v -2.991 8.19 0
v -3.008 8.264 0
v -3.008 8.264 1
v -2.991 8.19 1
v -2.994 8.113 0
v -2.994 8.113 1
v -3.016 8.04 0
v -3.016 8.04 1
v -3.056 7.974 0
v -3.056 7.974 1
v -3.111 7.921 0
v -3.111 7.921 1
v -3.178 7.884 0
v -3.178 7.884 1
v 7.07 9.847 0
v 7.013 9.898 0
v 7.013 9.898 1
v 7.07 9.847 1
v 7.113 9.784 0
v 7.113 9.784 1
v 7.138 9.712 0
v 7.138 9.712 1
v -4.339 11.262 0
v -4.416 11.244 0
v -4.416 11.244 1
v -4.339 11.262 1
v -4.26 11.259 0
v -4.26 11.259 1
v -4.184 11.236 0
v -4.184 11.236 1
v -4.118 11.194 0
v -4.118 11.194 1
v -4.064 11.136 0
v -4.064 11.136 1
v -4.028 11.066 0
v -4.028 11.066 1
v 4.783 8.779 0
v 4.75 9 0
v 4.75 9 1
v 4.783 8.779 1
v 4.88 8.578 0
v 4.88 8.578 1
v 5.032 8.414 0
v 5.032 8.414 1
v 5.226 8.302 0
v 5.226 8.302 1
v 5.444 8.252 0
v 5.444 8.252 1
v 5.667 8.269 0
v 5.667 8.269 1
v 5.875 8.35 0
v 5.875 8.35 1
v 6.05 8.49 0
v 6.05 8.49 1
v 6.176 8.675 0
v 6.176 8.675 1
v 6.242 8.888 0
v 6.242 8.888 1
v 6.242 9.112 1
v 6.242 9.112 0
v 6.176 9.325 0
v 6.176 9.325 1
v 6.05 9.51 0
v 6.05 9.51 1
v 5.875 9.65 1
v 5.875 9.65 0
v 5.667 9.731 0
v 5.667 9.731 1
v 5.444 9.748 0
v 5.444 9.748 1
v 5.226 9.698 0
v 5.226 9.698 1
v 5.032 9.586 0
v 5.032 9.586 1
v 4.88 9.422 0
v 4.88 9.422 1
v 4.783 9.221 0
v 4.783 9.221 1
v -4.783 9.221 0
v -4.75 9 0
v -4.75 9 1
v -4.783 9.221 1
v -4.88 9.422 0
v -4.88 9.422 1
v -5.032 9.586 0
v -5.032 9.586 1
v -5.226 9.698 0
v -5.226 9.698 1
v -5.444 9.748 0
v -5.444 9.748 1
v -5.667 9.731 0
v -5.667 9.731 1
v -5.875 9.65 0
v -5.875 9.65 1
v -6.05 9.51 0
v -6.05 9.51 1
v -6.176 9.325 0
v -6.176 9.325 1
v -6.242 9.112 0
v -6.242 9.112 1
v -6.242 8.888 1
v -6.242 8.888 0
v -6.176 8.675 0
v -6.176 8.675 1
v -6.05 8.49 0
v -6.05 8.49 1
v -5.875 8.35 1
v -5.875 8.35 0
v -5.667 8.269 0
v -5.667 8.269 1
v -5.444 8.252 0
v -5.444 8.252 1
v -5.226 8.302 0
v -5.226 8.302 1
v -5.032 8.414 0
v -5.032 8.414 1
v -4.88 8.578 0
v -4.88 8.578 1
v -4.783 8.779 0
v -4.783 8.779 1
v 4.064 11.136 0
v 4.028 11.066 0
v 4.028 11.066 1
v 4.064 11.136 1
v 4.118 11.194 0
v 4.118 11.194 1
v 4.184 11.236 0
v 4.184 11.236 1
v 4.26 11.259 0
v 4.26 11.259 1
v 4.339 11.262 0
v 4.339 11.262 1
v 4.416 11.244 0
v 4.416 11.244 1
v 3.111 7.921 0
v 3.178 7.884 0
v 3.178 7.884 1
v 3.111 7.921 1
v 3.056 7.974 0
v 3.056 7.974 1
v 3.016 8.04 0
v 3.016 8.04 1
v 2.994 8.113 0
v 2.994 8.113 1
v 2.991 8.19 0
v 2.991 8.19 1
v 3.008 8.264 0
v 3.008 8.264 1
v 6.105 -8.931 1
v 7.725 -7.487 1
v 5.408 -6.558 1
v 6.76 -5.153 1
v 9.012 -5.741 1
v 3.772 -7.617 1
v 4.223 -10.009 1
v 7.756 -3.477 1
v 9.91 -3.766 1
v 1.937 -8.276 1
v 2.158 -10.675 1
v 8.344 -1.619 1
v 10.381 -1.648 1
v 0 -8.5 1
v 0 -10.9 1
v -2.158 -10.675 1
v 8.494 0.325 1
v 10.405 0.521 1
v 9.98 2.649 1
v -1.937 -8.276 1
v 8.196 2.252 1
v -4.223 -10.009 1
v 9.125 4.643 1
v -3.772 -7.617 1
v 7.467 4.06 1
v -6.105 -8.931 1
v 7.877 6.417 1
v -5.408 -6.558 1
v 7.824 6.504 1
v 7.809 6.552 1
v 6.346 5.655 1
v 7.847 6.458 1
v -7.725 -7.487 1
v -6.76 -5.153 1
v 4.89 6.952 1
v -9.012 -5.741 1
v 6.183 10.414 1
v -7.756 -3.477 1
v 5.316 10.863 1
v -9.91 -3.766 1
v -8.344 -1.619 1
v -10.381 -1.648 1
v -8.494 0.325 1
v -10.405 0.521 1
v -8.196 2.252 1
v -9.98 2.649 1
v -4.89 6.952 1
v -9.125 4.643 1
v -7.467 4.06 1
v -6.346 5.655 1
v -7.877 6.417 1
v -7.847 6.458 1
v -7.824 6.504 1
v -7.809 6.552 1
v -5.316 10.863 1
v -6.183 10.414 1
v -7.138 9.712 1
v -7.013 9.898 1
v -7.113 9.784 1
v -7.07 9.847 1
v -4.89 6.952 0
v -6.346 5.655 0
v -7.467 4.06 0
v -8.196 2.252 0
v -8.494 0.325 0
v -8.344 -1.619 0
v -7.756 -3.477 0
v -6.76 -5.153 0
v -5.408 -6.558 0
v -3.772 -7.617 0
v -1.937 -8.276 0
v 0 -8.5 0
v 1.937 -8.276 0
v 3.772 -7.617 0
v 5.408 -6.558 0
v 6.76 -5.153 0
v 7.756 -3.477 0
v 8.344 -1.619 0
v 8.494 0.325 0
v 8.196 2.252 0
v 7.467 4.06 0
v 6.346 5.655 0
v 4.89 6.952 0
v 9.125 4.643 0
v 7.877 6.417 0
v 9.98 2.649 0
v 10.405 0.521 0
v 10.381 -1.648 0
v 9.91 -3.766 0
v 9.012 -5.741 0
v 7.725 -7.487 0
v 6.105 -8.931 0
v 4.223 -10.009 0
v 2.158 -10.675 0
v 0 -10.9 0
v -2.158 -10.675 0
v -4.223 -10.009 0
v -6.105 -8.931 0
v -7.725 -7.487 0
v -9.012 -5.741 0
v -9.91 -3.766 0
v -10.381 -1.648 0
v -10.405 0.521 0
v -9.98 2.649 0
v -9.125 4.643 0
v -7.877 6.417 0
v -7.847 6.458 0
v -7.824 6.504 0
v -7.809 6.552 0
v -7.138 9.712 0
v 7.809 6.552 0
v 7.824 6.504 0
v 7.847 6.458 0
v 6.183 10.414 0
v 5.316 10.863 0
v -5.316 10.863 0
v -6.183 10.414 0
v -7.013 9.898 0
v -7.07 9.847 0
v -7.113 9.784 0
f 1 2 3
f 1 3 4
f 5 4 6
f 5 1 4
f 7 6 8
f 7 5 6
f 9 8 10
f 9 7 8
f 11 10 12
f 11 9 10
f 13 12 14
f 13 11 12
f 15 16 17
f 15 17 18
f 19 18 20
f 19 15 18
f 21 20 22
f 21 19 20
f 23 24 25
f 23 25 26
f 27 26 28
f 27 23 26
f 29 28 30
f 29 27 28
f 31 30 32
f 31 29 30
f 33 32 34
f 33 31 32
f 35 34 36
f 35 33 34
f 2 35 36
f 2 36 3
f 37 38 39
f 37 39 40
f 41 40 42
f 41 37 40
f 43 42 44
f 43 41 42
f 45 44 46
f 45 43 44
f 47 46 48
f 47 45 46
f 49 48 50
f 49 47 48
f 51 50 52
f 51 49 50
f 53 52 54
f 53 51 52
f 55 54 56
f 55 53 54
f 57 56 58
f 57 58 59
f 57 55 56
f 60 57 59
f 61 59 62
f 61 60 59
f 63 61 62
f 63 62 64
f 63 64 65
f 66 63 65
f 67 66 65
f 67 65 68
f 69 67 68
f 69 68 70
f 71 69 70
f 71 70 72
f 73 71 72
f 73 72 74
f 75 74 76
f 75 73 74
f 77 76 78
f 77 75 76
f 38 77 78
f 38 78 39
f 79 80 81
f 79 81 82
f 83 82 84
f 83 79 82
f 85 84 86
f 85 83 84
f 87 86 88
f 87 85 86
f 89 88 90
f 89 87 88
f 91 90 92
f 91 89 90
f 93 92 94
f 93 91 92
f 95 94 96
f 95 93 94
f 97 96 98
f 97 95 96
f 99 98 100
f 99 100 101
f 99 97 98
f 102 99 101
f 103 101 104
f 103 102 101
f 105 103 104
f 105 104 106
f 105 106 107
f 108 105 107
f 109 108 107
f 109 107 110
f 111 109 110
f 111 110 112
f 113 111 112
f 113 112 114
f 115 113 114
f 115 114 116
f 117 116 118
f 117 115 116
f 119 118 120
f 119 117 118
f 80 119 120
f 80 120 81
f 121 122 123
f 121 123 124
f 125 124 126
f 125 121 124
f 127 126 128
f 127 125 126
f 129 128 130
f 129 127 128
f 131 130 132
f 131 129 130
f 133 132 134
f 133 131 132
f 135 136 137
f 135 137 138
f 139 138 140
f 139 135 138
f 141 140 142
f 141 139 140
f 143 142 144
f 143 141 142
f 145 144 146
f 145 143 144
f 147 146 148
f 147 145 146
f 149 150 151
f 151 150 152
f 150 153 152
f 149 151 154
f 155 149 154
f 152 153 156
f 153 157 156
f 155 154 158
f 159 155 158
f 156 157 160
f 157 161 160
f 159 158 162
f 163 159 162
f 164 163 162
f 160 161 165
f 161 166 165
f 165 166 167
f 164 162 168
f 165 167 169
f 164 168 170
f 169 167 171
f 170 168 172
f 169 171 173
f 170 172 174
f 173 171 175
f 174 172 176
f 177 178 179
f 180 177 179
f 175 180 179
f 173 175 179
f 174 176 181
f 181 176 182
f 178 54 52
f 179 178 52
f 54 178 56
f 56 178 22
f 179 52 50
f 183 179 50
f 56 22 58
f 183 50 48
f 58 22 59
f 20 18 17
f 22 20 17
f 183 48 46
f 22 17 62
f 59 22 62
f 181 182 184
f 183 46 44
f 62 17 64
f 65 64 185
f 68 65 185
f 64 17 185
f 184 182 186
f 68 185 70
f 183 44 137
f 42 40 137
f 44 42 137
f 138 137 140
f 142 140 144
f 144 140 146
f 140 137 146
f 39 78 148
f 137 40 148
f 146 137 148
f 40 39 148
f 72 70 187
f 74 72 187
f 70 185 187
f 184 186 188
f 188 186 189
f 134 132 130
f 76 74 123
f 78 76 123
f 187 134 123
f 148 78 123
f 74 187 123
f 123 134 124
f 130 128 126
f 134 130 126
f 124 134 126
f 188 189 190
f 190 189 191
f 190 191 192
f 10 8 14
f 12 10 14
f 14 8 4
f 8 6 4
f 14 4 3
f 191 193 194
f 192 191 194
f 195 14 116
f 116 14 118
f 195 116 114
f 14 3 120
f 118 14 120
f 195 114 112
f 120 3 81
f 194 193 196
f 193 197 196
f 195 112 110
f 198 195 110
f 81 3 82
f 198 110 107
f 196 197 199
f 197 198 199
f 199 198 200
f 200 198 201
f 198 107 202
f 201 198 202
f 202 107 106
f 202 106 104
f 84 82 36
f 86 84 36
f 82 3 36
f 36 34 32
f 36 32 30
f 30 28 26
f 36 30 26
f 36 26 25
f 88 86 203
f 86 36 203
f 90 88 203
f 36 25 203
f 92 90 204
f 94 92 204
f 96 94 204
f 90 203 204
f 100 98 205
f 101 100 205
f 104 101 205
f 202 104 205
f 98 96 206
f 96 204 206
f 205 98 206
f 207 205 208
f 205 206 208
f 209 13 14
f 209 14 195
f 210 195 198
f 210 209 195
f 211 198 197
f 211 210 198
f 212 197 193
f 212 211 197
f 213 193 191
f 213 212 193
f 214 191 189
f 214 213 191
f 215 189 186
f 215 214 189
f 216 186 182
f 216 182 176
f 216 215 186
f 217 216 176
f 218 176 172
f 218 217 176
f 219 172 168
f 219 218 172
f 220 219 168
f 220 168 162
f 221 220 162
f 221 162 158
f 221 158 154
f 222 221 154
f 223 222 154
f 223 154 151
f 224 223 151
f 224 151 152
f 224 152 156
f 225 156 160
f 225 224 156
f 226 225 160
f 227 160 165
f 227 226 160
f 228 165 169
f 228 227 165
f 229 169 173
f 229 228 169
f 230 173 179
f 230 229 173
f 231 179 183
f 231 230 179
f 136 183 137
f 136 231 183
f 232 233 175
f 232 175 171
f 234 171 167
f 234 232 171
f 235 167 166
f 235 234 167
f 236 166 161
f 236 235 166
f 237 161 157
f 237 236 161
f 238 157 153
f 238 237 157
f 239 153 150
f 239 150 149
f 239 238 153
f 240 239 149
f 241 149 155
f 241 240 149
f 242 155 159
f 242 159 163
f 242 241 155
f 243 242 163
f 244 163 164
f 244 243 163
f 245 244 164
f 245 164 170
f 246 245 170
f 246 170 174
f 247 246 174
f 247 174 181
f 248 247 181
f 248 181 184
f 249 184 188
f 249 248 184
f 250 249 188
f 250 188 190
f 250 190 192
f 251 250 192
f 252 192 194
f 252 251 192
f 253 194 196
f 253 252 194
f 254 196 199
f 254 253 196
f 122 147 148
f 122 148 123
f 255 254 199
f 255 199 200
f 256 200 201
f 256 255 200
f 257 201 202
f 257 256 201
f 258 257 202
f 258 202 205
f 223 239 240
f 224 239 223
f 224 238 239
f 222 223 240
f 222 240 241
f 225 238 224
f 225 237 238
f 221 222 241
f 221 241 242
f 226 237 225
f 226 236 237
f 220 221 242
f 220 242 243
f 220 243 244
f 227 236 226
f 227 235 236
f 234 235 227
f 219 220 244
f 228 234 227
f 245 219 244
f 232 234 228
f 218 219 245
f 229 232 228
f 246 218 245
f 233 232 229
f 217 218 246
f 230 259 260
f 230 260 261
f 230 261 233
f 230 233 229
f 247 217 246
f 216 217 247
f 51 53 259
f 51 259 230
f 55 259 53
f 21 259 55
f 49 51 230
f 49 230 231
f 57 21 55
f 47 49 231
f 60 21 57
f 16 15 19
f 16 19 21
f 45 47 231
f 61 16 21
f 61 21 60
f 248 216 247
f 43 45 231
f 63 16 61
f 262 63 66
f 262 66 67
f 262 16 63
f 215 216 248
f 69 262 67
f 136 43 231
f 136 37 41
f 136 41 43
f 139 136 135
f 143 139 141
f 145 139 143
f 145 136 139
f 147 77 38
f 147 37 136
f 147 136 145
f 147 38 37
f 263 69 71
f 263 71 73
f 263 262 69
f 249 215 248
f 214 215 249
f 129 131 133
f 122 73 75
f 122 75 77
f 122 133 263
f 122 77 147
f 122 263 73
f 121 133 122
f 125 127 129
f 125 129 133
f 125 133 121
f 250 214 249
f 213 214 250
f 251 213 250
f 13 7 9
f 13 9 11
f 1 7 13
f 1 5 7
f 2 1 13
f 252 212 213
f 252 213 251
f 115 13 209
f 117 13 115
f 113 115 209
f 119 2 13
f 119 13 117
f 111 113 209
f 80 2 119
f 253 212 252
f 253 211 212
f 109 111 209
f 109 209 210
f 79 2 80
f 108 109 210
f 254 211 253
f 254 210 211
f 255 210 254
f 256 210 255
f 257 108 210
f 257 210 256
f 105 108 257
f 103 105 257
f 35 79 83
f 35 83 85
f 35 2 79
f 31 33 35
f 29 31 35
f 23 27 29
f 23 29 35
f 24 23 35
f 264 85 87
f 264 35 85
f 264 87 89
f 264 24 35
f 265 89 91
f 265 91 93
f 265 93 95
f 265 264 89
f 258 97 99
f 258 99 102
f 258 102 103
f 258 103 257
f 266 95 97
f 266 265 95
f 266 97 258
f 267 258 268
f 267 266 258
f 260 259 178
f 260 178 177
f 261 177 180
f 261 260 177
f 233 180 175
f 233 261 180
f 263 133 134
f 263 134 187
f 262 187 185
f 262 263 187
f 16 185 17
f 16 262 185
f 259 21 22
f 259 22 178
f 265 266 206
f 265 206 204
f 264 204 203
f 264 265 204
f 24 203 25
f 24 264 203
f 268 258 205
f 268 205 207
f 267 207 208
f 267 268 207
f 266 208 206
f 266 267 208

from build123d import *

# Parameters (mm, degrees)
ESQUISSE1_R      = 0.75
EXTRUSION1_DEPTH = 1


with BuildPart() as part:
    # Esquisse1 → Extrusion1 (new body)
    with BuildSketch(Plane.XY):
        with BuildLine():
            Line((-7.809424908, 6.552045147), (-7.137842505, 9.711591939))
            ThreePointArc((-7.137842505, 9.711591939), (-7.093293962, 9.816702497), (-7.012703099, 9.897559869))
            ThreePointArc((-7.012703099, 9.897559869), (-5.753680876, 10.647078732), (-4.415601587, 11.244120857))
            ThreePointArc((-4.415601587, 11.244120857), (-4.184471882, 11.23610854), (-4.027719362, 11.066068))
            Line((-4.027719362, 11.066068), (-3.008027786, 8.26448842))
            ThreePointArc((-3.008027786, 8.26448842), (-3.015921319, 8.039750525), (-3.177778678, 7.883636386))
            ThreePointArc((-3.177778678, 7.883636386), (0, -8.5), (3.177778678, 7.883636386))
            ThreePointArc((3.177778678, 7.883636386), (3.015921319, 8.039750525), (3.008027786, 8.26448842))
            Line((3.008027786, 8.26448842), (4.027719362, 11.066068))
            ThreePointArc((4.027719362, 11.066068), (4.184471882, 11.23610854), (4.415601587, 11.244120857))
            ThreePointArc((4.415601587, 11.244120857), (5.753680876, 10.647078732), (7.012703099, 9.897559869))
            ThreePointArc((7.012703099, 9.897559869), (7.093293962, 9.816702497), (7.137842505, 9.711591939))
            Line((7.137842505, 9.711591939), (7.809424908, 6.552045147))
            ThreePointArc((7.809424908, 6.552045147), (7.834486225, 6.480364242), (7.876742606, 6.417272087))
            ThreePointArc((7.876742606, 6.417272087), (0, -10.9), (-7.876742606, 6.417272087))
            ThreePointArc((-7.876742606, 6.417272087), (-7.834486225, 6.480364242), (-7.809424908, 6.552045147))
        make_face()
        with Locations((-5.5, 9)):
            Circle(ESQUISSE1_R, mode=Mode.SUBTRACT)
        with Locations((5.5, 9)):
            Circle(ESQUISSE1_R, mode=Mode.SUBTRACT)
    extrude(amount=EXTRUSION1_DEPTH)


solid = part.part
